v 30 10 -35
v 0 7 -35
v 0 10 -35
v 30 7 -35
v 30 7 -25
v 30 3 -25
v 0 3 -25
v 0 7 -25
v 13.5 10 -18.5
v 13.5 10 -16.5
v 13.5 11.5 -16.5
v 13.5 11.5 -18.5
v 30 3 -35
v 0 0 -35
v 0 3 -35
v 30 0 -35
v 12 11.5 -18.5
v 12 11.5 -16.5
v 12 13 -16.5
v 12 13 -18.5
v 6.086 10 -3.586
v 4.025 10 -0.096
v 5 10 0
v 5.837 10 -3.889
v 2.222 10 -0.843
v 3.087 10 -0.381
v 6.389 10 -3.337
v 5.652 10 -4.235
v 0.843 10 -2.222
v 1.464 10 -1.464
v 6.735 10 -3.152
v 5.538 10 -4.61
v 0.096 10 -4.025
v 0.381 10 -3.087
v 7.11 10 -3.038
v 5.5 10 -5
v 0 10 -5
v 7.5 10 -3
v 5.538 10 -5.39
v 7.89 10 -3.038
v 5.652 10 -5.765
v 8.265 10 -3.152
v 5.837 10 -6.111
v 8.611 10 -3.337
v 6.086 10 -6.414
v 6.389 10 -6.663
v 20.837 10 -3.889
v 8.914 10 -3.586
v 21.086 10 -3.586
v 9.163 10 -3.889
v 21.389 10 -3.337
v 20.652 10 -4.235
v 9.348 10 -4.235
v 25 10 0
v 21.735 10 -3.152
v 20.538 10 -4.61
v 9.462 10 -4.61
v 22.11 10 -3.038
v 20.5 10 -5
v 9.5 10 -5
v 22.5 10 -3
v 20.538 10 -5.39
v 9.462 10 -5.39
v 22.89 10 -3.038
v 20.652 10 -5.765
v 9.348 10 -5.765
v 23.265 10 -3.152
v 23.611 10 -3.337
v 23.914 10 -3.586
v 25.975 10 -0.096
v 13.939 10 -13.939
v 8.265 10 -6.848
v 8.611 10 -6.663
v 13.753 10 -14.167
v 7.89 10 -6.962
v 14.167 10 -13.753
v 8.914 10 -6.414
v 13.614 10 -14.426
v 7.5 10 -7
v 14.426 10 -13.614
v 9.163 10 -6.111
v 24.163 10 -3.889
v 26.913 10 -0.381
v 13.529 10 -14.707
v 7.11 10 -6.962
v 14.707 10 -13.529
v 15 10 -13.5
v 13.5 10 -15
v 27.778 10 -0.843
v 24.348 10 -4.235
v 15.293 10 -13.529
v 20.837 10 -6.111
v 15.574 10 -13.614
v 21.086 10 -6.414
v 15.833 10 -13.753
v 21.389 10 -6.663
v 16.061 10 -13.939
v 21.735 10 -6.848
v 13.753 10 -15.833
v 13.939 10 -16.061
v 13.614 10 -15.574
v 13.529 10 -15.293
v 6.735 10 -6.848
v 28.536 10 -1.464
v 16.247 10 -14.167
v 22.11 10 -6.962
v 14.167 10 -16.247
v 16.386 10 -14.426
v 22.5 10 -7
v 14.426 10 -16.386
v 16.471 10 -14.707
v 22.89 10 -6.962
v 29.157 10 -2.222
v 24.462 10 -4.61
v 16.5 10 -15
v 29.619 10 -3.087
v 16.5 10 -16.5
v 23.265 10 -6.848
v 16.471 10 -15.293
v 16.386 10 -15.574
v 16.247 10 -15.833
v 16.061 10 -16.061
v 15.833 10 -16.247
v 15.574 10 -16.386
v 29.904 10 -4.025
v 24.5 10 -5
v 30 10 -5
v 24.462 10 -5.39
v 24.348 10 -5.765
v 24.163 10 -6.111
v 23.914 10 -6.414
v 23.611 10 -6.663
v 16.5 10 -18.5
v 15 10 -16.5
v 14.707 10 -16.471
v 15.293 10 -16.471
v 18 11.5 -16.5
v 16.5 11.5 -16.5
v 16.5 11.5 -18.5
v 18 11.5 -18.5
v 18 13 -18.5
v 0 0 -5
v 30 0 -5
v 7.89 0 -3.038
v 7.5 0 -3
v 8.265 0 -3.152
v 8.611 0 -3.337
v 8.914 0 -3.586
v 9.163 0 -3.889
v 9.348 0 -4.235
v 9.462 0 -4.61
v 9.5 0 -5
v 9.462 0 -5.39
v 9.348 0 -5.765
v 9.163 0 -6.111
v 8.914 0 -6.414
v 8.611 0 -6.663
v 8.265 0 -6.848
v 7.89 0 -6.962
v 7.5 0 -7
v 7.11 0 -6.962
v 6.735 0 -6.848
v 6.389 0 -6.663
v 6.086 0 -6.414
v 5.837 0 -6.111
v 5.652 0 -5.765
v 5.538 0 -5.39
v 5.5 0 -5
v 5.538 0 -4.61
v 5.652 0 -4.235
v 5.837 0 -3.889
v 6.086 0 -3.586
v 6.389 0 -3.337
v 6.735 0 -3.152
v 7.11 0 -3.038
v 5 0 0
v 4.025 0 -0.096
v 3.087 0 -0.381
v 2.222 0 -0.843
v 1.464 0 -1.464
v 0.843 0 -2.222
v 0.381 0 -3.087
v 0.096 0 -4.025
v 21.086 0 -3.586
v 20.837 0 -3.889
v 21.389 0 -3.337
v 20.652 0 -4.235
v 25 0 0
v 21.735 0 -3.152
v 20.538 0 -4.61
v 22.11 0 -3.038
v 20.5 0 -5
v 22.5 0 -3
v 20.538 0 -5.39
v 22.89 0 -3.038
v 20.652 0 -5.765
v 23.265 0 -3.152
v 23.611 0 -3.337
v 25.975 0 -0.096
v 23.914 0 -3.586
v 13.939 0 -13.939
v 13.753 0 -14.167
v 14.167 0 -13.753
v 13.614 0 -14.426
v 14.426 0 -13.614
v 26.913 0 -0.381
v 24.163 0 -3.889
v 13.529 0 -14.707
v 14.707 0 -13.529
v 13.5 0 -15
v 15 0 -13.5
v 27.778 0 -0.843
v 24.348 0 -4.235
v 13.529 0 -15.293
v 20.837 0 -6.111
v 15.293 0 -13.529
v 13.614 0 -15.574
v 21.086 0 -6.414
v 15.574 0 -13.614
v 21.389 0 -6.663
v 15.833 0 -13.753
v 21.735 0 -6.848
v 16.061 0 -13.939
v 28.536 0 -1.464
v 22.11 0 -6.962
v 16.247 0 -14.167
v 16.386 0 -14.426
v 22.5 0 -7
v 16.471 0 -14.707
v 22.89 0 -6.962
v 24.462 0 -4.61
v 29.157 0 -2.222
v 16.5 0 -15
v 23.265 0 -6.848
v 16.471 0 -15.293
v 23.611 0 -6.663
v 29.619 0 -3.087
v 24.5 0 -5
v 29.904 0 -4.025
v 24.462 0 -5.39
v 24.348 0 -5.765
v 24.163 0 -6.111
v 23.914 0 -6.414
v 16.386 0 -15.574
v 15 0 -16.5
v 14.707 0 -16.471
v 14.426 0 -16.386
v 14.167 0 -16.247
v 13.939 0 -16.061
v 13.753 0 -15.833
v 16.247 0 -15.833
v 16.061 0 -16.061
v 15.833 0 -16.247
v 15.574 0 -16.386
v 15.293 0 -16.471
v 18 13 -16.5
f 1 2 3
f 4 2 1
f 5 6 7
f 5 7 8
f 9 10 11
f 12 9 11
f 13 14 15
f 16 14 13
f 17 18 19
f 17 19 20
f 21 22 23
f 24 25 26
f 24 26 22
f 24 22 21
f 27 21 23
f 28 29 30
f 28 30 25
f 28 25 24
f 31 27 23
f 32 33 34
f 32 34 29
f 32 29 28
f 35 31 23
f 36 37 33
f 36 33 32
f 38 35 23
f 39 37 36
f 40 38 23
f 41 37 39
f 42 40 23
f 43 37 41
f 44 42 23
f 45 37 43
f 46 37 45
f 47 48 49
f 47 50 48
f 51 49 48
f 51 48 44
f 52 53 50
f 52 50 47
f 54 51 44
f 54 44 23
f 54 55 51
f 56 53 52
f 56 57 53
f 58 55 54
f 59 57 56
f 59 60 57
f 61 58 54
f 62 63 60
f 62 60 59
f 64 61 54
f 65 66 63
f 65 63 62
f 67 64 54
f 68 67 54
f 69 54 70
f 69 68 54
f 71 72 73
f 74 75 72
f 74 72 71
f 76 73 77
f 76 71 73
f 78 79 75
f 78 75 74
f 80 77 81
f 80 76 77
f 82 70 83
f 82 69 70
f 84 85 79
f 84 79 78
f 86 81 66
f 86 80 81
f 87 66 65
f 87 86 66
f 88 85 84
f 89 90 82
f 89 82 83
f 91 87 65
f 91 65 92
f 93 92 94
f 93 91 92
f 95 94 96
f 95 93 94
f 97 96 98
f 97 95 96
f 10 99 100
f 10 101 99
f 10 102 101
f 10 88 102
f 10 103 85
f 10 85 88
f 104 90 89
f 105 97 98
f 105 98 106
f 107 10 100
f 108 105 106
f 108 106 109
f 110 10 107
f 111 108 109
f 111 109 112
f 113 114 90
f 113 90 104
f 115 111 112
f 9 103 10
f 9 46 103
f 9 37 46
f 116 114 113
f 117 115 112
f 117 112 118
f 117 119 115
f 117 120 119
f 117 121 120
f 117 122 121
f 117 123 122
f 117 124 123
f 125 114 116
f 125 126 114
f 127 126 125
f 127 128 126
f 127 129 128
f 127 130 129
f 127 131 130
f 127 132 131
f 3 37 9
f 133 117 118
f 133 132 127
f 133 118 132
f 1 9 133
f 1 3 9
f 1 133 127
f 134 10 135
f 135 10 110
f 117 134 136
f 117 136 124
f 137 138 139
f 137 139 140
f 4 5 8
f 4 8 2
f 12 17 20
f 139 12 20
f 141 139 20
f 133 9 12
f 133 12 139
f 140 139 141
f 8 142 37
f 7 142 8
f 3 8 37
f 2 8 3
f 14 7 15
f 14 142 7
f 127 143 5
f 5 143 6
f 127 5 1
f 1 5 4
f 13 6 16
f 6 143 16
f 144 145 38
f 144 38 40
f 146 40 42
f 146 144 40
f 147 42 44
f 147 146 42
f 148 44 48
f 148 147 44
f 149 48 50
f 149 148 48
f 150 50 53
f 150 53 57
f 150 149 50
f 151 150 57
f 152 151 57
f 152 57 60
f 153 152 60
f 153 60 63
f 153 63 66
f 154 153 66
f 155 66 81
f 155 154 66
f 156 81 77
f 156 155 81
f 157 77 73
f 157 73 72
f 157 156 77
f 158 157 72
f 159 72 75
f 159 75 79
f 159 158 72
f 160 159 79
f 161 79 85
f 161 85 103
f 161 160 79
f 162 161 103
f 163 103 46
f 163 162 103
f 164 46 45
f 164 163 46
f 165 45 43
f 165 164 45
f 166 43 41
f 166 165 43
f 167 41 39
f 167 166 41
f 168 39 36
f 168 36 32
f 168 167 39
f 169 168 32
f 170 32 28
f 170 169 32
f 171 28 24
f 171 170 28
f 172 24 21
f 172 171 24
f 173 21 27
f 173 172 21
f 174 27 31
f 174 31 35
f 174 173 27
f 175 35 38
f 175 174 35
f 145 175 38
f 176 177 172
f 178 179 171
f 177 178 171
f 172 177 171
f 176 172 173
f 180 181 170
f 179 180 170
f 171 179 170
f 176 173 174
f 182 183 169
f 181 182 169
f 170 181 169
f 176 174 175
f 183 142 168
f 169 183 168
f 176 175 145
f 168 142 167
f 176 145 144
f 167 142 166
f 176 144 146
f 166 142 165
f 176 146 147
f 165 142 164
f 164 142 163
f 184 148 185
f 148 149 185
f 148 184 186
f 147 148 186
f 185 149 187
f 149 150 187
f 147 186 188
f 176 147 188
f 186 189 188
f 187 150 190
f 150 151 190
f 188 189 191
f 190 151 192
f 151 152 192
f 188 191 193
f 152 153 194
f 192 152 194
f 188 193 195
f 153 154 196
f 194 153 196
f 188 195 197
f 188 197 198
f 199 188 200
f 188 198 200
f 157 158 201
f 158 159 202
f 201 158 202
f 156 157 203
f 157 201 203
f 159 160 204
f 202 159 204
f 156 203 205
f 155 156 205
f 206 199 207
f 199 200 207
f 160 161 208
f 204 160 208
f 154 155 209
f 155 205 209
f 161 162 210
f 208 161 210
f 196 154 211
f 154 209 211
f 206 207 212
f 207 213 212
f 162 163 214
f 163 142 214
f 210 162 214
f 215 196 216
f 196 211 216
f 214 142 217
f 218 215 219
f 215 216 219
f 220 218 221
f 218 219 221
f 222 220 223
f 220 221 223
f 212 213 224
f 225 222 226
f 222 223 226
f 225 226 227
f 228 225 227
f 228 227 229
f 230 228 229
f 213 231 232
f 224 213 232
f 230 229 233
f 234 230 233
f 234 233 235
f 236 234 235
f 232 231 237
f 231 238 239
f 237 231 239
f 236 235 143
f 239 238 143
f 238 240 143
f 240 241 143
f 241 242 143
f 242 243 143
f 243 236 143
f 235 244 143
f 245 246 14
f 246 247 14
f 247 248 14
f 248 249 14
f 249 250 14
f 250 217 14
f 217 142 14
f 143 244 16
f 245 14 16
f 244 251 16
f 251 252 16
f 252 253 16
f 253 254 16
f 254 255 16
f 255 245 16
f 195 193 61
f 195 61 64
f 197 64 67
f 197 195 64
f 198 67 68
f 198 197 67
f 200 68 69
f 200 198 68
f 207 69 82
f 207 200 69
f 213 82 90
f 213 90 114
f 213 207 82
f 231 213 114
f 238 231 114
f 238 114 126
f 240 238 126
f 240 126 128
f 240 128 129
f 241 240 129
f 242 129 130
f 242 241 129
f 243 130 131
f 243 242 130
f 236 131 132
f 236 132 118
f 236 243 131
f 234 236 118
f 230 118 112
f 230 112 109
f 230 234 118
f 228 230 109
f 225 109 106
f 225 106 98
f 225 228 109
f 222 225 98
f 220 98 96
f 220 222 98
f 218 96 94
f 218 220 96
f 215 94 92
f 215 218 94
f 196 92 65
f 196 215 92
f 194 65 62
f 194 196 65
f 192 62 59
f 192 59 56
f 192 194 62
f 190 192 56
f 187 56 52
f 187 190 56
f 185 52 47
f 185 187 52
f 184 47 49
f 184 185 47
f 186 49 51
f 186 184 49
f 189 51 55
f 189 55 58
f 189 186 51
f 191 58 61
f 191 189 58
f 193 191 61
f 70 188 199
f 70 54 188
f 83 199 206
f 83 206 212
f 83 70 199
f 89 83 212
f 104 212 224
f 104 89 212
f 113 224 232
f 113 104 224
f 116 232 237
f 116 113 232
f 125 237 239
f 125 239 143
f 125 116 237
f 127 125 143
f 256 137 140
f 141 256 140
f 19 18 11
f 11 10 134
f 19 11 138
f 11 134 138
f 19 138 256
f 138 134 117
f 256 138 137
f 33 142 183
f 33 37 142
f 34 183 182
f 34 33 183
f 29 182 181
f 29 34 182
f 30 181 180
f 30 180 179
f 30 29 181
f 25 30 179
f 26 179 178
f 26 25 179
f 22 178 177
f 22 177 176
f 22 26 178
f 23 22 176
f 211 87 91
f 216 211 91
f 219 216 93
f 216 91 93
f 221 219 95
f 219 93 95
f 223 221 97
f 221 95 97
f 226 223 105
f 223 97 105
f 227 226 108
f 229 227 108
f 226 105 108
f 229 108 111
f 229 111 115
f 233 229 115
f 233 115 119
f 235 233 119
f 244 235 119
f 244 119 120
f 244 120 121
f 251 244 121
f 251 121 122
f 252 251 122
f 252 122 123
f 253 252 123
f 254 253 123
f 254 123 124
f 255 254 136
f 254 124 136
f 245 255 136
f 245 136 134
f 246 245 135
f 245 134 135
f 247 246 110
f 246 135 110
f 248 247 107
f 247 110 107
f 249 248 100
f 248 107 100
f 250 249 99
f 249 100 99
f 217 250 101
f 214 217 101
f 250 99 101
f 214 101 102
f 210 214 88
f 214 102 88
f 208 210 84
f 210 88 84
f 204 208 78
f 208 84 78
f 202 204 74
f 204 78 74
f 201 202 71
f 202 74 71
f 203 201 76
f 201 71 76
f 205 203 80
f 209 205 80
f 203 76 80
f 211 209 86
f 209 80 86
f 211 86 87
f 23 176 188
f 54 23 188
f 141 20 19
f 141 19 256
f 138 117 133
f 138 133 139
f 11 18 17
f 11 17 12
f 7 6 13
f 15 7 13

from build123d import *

# Parameters (mm, degrees)
CROQUIS1_W              = 30
CROQUIS1_H              = 35
CROQUIS1_R              = 2
SALIENTE_EXTRUIR1_DEPTH = 10
CROQUIS2_W              = 10
CROQUIS2_H              = 4
CORTAR_EXTRUIR1_DEPTH   = 41
REDONDEO1_R             = 5
CROQUIS3_R              = 1.5
CORTAR_EXTRUIR2_DEPTH   = 10
CROQUIS4_W              = 6
CROQUIS4_H              = 2
SALIENTE_EXTRUIR2_DEPTH = 3
CROQUIS5_W              = 1.5
CROQUIS5_H              = 1.5
CORTAR_EXTRUIR3_DEPTH   = 3


with BuildPart() as part:
    # Croquis1 → Saliente-Extruir1 (new body)
    with BuildSketch(Plane(origin=(0, 0, 0), x_dir=(1, 0, 0), z_dir=(0, 1, 0))):
        with Locations((15, 17.5)):
            Rectangle(CROQUIS1_W, CROQUIS1_H)
        with Locations(Location((7.5, 5, 0), (0, 0, 270))):
            Circle(CROQUIS1_R, mode=Mode.SUBTRACT)
        with Locations(Location((22.5, 5, 0), (0, 0, 270))):
            Circle(CROQUIS1_R, mode=Mode.SUBTRACT)
    extrude(amount=SALIENTE_EXTRUIR1_DEPTH)

    # Croquis2 → Cortar-Extruir1 (cut)
    with BuildSketch(Plane(origin=(30, 0, 0), x_dir=(0, 0, -1), z_dir=(1, 0, 0))):
        with Locations((30, 5)):
            Rectangle(CROQUIS2_W, CROQUIS2_H)
    extrude(amount=-CORTAR_EXTRUIR1_DEPTH, mode=Mode.SUBTRACT)

    # Redondeo1
    redondeo1_edges = [part.edges().sort_by_distance(p)[0] for p in [
        (30, 5, 0),
        (0, 5, 0),
    ]]
    fillet(redondeo1_edges, radius=REDONDEO1_R)

    # Croquis3 → Cortar-Extruir2 (cut)
    with BuildSketch(Plane(origin=(0, 10, 0), x_dir=(1, 0, 0), z_dir=(0, 1, 0))):
        with Locations(Location((15, 15, 0), (0, 0, 270))):
            Circle(CROQUIS3_R)
    extrude(amount=-CORTAR_EXTRUIR2_DEPTH, mode=Mode.SUBTRACT)

    # Croquis4 → Saliente-Extruir2 (add)
    with BuildSketch(Plane(origin=(0, 10, 0), x_dir=(1, 0, 0), z_dir=(0, 1, 0))):
        with Locations((15, 17.5)):
            Rectangle(CROQUIS4_W, CROQUIS4_H)
    extrude(amount=SALIENTE_EXTRUIR2_DEPTH)

    # Croquis5 → Cortar-Extruir3 (cut)
    with BuildSketch(Plane.XY.offset(-16.5)):
        with Locations((17.25, 10.75)):
            Rectangle(CROQUIS5_W, CROQUIS5_H)
        with Locations((12.75, 10.75)):
            Rectangle(CROQUIS5_W, CROQUIS5_H)
    extrude(amount=-CORTAR_EXTRUIR3_DEPTH, mode=Mode.SUBTRACT)


solid = part.part
